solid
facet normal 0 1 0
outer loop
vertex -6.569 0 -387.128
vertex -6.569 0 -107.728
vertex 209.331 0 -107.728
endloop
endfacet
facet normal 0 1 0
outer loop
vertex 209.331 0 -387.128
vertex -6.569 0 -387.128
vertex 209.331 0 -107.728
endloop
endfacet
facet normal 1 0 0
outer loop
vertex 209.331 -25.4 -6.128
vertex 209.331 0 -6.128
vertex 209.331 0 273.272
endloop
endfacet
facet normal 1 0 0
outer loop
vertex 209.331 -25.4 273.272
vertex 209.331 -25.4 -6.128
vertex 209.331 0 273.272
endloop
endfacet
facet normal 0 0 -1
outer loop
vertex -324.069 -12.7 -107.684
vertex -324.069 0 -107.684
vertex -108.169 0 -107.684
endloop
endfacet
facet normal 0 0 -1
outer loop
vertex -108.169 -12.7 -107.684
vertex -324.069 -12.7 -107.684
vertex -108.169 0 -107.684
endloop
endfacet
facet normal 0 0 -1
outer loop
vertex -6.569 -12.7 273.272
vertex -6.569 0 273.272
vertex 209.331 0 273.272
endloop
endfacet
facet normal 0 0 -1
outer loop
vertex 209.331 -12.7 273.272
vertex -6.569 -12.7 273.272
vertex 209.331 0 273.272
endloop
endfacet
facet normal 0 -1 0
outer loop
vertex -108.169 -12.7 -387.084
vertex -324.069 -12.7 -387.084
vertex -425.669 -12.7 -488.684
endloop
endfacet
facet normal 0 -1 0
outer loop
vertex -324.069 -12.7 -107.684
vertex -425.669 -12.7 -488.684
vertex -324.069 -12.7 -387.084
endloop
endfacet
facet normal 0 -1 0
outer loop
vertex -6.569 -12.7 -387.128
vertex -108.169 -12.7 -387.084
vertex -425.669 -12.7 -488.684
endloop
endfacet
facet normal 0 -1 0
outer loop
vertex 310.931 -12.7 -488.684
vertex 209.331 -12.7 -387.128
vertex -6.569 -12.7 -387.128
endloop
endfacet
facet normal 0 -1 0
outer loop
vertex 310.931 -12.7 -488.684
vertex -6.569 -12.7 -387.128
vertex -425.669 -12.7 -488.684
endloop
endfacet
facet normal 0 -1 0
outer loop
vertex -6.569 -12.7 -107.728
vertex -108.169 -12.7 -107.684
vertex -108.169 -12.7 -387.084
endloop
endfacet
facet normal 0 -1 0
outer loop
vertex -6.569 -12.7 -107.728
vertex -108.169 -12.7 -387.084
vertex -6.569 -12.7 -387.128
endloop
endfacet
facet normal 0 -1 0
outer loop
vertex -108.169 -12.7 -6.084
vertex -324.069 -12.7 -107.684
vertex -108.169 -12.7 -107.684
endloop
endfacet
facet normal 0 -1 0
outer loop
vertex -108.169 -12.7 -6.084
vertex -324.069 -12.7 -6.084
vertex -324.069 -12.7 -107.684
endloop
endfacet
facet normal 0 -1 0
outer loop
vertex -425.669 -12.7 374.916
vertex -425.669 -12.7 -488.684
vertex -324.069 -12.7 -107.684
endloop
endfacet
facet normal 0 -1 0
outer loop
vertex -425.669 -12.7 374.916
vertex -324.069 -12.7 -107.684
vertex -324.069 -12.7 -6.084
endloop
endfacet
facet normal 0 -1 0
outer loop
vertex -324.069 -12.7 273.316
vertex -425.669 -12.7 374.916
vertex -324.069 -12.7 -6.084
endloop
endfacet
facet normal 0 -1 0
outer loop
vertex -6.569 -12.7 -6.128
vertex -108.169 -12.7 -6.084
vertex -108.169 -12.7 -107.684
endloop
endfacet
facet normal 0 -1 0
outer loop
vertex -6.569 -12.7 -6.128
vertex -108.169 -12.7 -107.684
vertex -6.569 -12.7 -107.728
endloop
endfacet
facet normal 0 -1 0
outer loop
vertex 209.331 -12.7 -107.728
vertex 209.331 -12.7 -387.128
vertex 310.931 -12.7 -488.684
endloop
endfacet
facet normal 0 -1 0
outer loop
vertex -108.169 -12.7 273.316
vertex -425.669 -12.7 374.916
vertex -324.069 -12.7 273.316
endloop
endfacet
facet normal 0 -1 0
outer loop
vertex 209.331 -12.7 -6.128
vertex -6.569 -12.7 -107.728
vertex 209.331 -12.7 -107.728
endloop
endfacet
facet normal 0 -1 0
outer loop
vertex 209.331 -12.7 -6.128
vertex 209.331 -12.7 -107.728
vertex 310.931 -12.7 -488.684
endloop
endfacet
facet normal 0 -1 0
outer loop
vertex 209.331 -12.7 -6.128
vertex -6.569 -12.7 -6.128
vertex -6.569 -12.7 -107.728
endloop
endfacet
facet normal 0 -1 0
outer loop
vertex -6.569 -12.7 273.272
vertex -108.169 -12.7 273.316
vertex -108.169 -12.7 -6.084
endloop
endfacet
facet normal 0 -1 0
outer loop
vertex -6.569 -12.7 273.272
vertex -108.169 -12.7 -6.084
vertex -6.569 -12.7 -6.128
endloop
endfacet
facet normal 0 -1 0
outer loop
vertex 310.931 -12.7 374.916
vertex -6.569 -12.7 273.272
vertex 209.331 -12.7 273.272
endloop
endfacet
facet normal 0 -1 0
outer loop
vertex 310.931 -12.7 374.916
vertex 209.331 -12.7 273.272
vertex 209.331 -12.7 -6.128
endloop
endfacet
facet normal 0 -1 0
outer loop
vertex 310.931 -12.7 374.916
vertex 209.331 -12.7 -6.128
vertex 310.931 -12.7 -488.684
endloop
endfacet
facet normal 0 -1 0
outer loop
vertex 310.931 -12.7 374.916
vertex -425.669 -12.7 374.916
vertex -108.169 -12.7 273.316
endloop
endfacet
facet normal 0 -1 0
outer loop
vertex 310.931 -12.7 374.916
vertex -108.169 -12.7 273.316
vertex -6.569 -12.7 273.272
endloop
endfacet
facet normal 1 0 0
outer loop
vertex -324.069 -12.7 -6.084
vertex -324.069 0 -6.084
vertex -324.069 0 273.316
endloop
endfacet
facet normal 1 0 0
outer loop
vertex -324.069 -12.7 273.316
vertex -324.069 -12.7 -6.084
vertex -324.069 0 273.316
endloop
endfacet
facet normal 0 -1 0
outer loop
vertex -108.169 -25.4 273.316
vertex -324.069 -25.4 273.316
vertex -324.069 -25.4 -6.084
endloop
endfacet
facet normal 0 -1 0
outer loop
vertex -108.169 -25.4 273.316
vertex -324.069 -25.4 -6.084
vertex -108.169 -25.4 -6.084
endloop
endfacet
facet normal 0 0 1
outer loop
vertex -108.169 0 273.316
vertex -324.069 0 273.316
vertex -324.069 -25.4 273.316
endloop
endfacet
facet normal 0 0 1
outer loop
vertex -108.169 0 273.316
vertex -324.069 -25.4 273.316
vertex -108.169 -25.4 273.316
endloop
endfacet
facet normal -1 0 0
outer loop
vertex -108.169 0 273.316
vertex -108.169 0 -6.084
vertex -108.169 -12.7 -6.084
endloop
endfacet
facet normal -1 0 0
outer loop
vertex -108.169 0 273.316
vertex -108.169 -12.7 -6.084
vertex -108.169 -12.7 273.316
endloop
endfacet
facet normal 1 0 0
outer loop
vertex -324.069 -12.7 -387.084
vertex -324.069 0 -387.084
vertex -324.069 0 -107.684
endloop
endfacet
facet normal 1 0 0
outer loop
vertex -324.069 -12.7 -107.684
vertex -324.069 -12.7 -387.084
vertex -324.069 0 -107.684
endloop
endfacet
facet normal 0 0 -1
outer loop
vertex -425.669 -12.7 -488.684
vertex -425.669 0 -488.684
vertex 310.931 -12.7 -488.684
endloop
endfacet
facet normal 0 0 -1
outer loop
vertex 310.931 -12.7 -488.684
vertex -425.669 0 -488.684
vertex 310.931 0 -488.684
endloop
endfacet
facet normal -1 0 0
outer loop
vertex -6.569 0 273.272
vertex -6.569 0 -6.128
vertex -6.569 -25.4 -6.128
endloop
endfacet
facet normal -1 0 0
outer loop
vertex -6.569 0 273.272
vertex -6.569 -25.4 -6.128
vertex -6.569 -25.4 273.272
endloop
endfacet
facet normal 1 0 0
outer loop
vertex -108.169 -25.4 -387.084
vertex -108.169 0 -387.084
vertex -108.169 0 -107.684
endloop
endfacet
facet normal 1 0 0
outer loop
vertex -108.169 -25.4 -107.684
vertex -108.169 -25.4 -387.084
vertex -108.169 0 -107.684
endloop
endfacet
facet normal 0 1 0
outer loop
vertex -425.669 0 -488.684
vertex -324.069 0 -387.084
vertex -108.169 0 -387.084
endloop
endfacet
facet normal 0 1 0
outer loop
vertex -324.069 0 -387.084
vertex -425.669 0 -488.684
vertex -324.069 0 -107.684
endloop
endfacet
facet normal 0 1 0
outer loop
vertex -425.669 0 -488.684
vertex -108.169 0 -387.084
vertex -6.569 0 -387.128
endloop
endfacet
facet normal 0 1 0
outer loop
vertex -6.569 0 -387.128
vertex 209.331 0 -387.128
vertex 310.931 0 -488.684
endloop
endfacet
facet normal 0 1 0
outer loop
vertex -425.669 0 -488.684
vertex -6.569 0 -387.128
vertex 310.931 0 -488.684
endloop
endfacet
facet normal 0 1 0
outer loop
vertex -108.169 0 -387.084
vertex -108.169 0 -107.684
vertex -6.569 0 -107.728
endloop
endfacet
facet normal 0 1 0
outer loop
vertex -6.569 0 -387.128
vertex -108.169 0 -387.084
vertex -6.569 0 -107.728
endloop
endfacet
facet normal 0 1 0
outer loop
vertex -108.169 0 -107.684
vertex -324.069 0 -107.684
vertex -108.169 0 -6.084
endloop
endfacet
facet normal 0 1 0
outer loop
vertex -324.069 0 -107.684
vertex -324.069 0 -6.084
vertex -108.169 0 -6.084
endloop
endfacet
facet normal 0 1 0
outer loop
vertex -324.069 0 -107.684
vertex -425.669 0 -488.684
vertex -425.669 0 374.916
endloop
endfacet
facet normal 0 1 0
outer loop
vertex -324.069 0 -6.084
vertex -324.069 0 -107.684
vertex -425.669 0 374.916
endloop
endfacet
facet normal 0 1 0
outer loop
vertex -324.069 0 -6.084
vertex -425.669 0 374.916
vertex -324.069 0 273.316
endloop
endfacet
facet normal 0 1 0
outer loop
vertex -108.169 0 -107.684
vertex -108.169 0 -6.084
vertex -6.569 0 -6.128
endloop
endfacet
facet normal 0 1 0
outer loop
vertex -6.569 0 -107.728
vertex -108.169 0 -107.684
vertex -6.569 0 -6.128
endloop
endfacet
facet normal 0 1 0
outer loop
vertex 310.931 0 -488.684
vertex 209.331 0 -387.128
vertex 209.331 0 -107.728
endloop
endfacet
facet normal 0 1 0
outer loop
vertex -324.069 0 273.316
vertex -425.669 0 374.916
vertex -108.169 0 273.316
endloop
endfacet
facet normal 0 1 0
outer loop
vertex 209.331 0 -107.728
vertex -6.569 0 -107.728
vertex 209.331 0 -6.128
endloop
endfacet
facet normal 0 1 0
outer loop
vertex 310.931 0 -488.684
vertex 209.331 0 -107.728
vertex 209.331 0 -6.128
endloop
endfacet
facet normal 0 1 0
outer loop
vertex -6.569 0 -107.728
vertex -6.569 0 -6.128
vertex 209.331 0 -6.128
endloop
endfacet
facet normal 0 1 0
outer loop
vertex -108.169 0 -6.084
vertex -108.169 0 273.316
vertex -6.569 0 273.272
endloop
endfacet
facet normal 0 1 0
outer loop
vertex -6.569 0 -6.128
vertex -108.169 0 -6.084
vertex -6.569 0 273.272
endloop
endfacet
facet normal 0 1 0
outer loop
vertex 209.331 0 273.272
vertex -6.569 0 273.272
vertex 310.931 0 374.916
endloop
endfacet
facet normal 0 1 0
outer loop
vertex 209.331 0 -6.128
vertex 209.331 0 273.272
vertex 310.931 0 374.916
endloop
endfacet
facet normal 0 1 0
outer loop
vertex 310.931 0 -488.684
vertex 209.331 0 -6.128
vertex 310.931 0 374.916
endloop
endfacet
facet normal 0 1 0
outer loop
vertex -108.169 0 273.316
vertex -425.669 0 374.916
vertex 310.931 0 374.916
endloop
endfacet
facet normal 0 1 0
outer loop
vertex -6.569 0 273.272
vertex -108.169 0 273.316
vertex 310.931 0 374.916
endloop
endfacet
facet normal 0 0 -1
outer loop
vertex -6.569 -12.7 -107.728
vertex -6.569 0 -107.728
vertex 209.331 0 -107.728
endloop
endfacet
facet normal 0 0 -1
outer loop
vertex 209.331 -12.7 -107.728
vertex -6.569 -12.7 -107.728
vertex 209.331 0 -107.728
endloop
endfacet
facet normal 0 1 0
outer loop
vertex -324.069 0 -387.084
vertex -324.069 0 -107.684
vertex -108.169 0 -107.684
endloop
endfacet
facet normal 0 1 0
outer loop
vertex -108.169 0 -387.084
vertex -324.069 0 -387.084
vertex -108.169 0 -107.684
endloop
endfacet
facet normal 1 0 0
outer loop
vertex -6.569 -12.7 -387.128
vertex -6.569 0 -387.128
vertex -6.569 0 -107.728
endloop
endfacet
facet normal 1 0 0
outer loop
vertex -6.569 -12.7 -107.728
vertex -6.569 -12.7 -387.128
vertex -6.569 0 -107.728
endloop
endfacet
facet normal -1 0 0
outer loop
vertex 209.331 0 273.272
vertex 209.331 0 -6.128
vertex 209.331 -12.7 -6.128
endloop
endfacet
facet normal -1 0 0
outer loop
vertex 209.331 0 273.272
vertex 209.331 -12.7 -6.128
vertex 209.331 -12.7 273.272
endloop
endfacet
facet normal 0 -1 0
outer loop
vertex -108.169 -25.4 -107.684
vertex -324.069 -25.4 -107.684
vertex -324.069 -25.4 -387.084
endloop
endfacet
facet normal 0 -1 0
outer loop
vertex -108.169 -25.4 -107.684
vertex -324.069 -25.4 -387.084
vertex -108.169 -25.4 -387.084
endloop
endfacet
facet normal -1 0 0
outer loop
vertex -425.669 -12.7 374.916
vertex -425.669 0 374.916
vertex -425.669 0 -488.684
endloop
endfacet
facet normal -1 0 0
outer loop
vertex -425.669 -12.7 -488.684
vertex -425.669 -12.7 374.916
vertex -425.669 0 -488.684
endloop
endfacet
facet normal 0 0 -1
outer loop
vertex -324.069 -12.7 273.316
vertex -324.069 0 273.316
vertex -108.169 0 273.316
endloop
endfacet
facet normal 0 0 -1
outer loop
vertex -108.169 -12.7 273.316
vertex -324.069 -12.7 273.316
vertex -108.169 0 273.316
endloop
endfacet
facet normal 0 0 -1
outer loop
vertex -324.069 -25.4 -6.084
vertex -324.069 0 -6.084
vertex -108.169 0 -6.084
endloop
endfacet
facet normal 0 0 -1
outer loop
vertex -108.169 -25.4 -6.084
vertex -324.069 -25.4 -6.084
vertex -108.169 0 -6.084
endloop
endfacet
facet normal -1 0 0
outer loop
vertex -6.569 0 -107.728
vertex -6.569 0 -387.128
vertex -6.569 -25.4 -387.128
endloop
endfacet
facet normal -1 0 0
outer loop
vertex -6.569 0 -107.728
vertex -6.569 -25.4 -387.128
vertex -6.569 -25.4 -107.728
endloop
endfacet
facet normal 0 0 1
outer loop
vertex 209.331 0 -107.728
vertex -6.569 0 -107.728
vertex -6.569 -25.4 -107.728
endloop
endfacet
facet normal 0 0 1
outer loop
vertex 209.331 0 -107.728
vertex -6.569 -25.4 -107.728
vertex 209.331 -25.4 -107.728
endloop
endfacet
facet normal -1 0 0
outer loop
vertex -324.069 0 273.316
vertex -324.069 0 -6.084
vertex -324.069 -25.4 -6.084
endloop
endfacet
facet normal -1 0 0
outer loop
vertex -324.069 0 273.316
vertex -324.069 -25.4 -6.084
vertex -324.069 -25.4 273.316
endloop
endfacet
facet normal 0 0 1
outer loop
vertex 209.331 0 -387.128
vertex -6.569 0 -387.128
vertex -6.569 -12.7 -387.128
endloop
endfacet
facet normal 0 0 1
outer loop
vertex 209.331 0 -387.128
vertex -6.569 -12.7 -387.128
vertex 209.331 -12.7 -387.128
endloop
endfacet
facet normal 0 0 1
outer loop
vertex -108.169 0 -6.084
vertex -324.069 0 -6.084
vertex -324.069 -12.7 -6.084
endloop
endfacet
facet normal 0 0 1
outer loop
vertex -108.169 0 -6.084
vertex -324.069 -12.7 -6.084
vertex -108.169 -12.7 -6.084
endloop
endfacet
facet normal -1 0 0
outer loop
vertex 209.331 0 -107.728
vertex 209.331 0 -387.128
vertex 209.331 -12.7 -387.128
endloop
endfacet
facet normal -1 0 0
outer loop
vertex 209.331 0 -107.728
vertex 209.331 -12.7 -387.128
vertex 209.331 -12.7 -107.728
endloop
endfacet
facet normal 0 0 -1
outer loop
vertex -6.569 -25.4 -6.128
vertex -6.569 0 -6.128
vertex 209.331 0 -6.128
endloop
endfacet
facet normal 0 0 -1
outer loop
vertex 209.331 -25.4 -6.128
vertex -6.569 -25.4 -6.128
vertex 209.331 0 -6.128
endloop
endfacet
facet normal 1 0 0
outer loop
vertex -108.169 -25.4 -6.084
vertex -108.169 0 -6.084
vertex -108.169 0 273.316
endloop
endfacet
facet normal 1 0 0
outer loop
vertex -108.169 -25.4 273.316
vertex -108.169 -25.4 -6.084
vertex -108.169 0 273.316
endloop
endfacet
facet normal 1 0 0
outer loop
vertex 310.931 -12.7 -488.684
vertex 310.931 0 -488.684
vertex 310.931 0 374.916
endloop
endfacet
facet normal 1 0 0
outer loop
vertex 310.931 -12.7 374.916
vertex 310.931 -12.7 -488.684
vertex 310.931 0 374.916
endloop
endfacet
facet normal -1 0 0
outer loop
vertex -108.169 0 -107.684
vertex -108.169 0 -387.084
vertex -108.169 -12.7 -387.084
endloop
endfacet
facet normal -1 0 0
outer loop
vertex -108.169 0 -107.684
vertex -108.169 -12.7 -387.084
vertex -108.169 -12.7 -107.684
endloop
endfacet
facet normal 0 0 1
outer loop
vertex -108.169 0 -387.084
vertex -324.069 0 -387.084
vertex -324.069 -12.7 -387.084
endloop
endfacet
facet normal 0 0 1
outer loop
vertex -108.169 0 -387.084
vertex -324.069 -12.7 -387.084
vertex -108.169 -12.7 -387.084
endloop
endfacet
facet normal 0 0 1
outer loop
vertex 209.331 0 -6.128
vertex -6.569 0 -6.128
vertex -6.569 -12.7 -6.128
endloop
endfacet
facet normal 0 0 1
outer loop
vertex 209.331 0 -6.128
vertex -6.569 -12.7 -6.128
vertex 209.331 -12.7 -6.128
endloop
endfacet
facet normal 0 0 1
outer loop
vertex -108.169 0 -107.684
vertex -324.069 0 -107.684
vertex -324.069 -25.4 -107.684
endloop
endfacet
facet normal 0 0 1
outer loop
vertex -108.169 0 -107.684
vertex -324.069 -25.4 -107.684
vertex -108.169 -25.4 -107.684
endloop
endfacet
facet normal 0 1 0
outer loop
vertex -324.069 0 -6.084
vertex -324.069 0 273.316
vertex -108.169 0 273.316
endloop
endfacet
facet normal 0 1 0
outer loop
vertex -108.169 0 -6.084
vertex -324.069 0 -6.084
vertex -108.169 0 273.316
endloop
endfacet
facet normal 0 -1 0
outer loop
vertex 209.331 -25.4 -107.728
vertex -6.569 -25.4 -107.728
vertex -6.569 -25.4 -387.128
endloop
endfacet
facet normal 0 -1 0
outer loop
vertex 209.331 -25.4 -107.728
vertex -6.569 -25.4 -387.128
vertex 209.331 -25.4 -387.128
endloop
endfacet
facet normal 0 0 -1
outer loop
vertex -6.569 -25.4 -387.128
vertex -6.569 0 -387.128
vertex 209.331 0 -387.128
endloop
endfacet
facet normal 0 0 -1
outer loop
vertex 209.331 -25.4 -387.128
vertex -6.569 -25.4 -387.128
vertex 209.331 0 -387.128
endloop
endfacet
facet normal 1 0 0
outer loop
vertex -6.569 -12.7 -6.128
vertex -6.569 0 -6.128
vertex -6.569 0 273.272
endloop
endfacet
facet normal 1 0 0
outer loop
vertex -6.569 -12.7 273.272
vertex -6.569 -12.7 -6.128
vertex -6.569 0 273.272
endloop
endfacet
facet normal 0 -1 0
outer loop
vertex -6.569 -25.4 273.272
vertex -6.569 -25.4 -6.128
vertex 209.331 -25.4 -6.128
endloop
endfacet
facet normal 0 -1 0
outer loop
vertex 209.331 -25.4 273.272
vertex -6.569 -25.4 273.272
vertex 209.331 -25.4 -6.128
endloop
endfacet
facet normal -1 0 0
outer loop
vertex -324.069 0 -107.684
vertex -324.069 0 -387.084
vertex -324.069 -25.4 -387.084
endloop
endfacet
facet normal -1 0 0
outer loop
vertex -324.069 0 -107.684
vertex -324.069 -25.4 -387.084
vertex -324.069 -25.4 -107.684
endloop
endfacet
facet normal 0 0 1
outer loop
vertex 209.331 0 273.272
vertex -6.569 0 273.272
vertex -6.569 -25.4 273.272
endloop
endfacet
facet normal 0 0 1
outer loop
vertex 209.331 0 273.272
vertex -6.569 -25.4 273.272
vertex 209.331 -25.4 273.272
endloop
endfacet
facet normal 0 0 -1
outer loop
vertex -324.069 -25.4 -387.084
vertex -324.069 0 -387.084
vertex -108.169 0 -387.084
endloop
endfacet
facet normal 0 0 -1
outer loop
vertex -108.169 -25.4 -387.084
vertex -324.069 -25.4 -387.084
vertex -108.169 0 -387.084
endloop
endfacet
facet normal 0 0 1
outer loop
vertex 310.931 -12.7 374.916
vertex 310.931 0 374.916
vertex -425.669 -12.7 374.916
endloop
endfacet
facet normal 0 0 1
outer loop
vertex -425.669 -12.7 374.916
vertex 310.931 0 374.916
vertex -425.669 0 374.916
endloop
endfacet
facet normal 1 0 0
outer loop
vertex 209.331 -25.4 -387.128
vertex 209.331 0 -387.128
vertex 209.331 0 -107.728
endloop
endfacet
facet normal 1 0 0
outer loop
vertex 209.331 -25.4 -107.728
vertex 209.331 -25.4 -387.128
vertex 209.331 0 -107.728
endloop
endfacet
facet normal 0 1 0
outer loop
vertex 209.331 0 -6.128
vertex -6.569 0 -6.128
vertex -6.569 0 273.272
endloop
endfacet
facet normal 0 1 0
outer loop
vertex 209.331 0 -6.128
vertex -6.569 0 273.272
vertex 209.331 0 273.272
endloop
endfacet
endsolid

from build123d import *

# Parameters (mm, degrees)
F0_W     = 215.9
F0_H     = 279.4
F1_DEPTH = 25.4
F2_DEPTH = 12.7


with BuildPart() as f1:
    # F0 (on Front) → F1 (new body)
    with BuildSketch(Plane.XZ):
        with Locations((101.381325, 133.572059)):
            Rectangle(F0_W, F0_H)
        with Locations((-216.118665, 133.615996)):
            Rectangle(F0_W, F0_H)
        with Locations((-216.118665, -247.384004)):
            Rectangle(F0_W, F0_H)
        with Locations((101.381325, -247.427941)):
            Rectangle(F0_W, F0_H)
    extrude(amount=F1_DEPTH)


with BuildPart() as f2:
    # F0 (on Front) → F2 (new body)
    with BuildSketch(Plane.XZ):
        Polygon((310.931335, 374.915996), (-324.068665, 374.915996), (-425.668665, 374.915996), (-425.668665, -488.684004), (310.931335, -488.684004), align=None)
        with Locations((-216.118665, -247.384004)):
            Rectangle(F0_W, F0_H, mode=Mode.SUBTRACT)
        with Locations((101.381325, -247.427941)):
            Rectangle(F0_W, F0_H, mode=Mode.SUBTRACT)
        with Locations((-216.118665, 133.615996)):
            Rectangle(F0_W, F0_H, mode=Mode.SUBTRACT)
        with Locations((101.381325, 133.572059)):
            Rectangle(F0_W, F0_H, mode=Mode.SUBTRACT)
    extrude(amount=F2_DEPTH)


solid = Compound([f1.part, f2.part])
